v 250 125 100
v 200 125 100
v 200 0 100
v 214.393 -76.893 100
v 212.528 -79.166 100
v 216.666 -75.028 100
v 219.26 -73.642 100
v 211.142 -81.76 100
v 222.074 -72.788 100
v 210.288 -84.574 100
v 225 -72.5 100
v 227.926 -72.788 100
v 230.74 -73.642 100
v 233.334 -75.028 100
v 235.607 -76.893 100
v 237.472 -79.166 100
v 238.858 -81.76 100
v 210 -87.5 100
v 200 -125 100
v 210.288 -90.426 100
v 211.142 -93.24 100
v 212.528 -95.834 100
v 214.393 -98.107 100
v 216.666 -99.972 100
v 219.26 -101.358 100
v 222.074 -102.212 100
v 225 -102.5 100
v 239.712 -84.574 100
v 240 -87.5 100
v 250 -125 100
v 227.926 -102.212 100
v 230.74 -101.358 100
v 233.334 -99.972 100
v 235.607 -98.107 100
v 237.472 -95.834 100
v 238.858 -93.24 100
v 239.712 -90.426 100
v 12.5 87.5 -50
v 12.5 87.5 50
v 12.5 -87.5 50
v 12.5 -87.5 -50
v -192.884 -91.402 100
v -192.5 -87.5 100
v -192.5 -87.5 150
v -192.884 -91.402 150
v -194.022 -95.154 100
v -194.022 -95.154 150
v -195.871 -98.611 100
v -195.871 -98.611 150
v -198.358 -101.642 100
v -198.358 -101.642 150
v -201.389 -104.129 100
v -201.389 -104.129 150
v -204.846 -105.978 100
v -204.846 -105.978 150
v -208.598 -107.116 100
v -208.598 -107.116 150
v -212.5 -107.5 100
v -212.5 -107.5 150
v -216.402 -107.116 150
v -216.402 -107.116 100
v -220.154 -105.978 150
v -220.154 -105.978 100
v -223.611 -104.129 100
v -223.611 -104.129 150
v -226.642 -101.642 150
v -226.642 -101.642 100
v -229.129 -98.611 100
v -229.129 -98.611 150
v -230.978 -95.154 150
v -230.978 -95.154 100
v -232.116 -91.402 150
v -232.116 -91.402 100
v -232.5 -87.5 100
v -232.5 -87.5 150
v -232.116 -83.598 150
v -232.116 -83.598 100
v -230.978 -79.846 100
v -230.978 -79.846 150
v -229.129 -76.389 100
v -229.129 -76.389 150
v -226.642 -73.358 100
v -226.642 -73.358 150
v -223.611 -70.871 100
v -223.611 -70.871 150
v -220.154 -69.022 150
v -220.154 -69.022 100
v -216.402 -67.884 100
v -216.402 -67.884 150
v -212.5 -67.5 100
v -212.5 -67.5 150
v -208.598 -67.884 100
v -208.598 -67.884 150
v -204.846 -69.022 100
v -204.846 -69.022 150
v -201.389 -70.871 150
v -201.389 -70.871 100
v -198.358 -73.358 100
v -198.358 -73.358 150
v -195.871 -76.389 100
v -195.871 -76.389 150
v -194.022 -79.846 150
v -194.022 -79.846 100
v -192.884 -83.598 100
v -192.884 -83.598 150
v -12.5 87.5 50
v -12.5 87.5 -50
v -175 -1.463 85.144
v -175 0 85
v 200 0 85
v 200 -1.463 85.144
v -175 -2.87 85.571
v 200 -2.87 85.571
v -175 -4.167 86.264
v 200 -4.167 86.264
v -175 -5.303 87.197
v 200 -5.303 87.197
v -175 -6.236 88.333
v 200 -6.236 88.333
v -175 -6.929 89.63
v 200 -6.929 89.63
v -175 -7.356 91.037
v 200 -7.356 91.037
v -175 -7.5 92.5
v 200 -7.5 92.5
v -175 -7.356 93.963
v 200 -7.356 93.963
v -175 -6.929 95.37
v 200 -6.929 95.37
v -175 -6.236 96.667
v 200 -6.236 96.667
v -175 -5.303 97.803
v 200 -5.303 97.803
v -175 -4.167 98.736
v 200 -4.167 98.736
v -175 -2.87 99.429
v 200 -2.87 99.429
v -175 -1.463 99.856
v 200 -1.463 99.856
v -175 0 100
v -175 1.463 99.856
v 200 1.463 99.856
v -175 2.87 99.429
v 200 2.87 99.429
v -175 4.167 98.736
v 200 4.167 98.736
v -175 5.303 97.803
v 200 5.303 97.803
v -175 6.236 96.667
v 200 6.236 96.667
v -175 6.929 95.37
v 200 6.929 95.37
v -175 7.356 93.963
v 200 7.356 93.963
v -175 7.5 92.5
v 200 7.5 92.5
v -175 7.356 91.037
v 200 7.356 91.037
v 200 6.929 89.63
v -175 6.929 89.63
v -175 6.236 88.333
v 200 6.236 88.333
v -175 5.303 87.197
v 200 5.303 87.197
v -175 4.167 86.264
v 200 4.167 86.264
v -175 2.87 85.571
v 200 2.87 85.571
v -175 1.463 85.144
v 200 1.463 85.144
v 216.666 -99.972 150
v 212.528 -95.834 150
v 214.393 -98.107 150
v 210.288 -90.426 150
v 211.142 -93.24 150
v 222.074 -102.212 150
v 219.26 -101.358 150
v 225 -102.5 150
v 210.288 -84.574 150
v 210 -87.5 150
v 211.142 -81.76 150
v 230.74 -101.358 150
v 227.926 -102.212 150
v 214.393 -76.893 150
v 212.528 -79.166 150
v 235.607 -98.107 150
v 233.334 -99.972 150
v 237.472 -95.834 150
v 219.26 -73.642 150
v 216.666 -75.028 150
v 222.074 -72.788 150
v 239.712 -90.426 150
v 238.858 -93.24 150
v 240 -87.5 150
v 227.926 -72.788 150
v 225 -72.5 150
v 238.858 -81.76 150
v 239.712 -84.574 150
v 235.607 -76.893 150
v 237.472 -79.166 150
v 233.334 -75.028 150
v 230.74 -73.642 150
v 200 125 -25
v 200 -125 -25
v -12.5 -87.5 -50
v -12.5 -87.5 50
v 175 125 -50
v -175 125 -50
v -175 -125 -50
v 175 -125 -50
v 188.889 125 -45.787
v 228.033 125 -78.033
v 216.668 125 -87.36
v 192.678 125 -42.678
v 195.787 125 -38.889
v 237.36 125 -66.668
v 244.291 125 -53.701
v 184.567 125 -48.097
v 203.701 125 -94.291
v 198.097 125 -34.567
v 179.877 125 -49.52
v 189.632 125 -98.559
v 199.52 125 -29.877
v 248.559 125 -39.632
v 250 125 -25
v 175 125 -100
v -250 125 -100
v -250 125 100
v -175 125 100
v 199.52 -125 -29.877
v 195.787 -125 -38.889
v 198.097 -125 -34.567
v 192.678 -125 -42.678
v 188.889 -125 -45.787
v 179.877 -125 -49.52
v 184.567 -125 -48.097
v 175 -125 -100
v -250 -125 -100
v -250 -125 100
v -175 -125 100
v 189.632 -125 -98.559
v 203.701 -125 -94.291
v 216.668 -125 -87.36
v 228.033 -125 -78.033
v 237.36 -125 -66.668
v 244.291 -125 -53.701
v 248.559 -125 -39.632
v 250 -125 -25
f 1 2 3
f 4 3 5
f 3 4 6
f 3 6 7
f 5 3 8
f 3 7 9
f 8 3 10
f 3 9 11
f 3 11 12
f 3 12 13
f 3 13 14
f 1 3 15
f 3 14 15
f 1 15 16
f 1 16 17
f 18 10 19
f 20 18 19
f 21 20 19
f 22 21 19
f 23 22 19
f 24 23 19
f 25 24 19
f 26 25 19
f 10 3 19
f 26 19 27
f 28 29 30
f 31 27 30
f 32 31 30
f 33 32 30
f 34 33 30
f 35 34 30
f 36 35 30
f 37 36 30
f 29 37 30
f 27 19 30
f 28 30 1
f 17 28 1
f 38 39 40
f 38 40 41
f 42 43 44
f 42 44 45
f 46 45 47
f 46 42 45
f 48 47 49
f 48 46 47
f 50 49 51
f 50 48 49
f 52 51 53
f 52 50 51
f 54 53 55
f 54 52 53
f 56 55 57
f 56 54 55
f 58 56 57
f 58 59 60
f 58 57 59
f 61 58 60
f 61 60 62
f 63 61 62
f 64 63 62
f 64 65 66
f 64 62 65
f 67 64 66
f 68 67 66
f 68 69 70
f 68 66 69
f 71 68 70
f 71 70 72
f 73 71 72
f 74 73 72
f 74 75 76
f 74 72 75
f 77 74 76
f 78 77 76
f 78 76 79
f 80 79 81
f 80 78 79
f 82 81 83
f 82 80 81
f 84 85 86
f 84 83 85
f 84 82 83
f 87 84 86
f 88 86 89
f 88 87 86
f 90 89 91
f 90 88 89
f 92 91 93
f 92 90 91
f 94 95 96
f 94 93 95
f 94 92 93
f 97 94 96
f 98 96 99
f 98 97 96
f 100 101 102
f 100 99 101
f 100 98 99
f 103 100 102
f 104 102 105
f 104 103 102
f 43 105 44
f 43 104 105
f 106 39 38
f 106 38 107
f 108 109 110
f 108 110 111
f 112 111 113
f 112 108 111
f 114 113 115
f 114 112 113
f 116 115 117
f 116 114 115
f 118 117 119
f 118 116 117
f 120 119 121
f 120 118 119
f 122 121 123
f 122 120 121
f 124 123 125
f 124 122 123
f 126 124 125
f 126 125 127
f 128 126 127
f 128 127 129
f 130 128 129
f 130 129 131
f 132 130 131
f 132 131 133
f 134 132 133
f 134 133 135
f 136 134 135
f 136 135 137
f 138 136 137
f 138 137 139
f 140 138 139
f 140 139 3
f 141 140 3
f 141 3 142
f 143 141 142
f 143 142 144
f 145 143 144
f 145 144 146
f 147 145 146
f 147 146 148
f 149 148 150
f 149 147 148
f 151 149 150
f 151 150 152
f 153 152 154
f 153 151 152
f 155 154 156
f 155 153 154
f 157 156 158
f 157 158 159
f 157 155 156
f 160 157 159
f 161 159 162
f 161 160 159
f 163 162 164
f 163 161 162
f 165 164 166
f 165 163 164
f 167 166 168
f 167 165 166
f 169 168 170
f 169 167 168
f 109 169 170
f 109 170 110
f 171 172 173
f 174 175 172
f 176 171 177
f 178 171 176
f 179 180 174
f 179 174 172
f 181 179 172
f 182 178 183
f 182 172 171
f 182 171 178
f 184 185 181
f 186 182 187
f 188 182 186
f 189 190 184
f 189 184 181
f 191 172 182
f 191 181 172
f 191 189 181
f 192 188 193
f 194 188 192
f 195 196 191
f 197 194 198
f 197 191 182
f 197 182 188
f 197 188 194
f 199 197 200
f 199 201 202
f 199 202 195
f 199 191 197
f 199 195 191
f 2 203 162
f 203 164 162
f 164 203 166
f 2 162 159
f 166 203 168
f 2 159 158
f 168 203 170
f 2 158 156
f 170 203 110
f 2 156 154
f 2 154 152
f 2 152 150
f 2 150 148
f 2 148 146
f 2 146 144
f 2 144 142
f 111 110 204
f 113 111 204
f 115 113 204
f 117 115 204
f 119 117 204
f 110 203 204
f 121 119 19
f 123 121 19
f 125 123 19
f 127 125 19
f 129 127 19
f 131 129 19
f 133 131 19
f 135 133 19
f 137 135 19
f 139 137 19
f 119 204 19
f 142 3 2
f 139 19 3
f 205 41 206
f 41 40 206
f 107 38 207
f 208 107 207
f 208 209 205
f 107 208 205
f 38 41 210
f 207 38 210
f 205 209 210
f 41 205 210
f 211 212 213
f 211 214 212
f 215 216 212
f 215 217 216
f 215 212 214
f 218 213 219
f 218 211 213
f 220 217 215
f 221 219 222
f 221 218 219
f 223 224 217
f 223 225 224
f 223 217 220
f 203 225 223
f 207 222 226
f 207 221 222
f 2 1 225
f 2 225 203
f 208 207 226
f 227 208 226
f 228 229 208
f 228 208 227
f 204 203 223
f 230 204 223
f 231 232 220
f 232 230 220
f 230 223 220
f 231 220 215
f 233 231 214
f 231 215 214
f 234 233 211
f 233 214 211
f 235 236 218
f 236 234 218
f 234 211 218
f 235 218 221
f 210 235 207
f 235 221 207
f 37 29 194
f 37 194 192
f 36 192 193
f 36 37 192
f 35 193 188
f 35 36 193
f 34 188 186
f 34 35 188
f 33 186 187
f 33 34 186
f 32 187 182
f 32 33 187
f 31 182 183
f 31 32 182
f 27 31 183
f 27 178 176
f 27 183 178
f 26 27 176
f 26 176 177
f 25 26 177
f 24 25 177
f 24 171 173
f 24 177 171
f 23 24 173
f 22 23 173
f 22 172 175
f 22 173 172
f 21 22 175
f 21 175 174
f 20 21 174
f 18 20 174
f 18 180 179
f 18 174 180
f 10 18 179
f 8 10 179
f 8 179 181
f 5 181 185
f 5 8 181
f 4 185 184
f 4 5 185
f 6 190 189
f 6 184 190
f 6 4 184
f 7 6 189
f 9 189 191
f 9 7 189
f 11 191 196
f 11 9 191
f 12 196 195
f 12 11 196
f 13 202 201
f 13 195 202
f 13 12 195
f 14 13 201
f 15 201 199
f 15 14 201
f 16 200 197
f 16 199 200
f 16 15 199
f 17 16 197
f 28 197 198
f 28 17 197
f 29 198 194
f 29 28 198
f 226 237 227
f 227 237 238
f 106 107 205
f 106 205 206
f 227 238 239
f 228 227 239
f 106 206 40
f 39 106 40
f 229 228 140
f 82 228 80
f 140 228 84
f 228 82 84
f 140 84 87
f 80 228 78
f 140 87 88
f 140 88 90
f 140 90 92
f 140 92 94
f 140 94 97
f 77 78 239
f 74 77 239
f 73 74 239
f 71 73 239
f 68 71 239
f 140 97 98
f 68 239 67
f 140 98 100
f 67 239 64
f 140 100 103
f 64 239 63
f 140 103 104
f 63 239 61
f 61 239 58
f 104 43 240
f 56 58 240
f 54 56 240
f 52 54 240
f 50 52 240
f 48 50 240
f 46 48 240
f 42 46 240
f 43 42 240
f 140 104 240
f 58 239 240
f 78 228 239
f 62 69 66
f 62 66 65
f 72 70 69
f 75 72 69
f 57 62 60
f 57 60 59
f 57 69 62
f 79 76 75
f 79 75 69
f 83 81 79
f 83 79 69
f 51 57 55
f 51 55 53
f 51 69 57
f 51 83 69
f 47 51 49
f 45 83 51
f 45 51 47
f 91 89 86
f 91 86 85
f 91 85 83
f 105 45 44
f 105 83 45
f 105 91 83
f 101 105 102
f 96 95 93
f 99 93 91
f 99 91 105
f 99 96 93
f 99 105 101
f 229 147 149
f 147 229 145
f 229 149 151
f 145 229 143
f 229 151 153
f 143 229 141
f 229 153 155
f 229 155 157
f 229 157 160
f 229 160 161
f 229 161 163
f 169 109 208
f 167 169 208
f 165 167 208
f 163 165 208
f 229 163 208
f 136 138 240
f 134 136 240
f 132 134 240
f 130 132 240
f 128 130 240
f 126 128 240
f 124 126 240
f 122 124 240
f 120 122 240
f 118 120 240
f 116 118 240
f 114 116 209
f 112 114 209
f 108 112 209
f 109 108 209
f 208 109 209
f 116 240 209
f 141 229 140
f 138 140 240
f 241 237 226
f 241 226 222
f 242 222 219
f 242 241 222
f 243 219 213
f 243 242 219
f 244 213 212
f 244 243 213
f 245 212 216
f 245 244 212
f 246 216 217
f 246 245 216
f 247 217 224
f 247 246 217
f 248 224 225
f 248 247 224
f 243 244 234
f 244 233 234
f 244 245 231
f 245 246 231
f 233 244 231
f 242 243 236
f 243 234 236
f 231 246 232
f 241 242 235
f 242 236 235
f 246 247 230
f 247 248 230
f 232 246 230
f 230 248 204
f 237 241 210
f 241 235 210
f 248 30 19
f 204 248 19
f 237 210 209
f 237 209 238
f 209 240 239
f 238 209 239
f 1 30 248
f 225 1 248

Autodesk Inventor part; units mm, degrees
ref_plane "YZ Plane" through (0, 0, 0) normal (1, 0, 0) x (0, 1, 0)
ref_plane "XZ Plane" through (0, 0, 0) normal (0, 1, 0) x (-1, 0, 0)
ref_plane "XY Plane" through (0, 0, 0) normal (0, 0, 1) x (1, 0, 0)
sketch "Sketch1" plane through (0, 0, 0) normal (0, 1, 0) x (-1, 0, 0)
  line L0 (0, -140) -> (0, 140) projected
  line L1 (-350, 0) -> (350, 0) projected
  line L2 (-250, 100) -> (-250, -100)
  line L3 (-250, -100) -> (250, -100)
  line L4 (250, -100) -> (250, 100)
  line L5 (250, 100) -> (175, 100)
  line L6 (175, 100) -> (175, -50)
  line L7 (175, -50) -> (-200, -50)
  line L8 (-200, -50) -> (-200, 100)
  line L9 (-200, 100) -> (-250, 100)
  dimension "d0" = 200
  dimension "d1" = 50
  dimension "d2" = 50
  dimension "d3" = 500
  dimension "d4" = 75
extrude "Extrusion1" add sketch "Sketch1" along normal mid plane 250 contours L3 L2 L1 L8 L7 L0 | L0 L7 L6 L1 L4 L3 | L2 L9 L8 L1 | L1 L6 L5 L4
fillet "Fillet1" radius 75 1 edges at (250, 0, -100)
fillet "Fillet1" radius 25 1 edges at (200, 0, -50)
sketch "Sketch2" plane through (-250, 125, 100) normal (0, 0, 1) x (1, 0, 0)
  line L0 (0, -250) -> (0, 0) projected
  line L1 (0, -250) -> (75, -250) projected
  line L2 (75, -250) -> (75, 0) projected
  circle A0 centre (37.5, -212.5) radius 37.5 construction
  circle A1 centre (37.5, -212.5) radius 20
  dimension "d9" = 40
extrude "Extrusion2" add sketch "Sketch2" along normal blind 50
sketch "Sketch3" plane through (200, 125, 100) normal (0, 0, 1) x (1, 0, 0)
  line L0 (0, -250) -> (50, -250) projected
  circle A0 centre (-412.5, -212.5) radius 20 projected
  circle A1 centre (25, -212.5) radius 15
  point P0 (25, -250)
  dimension "d12" = 30
extrude "Extrusion3" add sketch "Sketch3" along normal up to surface (50 mm away) contours A1
sketch "Sketch4" plane through (0, 0, 0) normal (0, 1, 0) x (-1, 0, 0)
  line L0 (-175, -50) -> (175, -50) projected
  line L1 (-12.5, -50) -> (12.5, -50)
  line L2 (12.5, -50) -> (12.5, 50)
  line L3 (12.5, 50) -> (-12.5, 50)
  line L4 (-12.5, 50) -> (-12.5, -50)
  line L5 (0, -150) -> (0, 200) projected
  dimension "d15" = 25
  dimension "d16" = 100
extrude "Extrusion4" add sketch "Sketch4" along normal mid plane 175
sketch "Sketch5" plane through (-175, -125, 100) normal (1, 0, 0) x (0, 0, -1)
  circle A0 centre (7.5, 125) radius 7.5
  line L0 (0, 250) -> (0, 0) projected
  point P0 (0, 125)
  dimension "d19" = 15
extrude "Extrusion5" add sketch "Sketch5" along normal up to next
properties part number "Interactice Exercise"
